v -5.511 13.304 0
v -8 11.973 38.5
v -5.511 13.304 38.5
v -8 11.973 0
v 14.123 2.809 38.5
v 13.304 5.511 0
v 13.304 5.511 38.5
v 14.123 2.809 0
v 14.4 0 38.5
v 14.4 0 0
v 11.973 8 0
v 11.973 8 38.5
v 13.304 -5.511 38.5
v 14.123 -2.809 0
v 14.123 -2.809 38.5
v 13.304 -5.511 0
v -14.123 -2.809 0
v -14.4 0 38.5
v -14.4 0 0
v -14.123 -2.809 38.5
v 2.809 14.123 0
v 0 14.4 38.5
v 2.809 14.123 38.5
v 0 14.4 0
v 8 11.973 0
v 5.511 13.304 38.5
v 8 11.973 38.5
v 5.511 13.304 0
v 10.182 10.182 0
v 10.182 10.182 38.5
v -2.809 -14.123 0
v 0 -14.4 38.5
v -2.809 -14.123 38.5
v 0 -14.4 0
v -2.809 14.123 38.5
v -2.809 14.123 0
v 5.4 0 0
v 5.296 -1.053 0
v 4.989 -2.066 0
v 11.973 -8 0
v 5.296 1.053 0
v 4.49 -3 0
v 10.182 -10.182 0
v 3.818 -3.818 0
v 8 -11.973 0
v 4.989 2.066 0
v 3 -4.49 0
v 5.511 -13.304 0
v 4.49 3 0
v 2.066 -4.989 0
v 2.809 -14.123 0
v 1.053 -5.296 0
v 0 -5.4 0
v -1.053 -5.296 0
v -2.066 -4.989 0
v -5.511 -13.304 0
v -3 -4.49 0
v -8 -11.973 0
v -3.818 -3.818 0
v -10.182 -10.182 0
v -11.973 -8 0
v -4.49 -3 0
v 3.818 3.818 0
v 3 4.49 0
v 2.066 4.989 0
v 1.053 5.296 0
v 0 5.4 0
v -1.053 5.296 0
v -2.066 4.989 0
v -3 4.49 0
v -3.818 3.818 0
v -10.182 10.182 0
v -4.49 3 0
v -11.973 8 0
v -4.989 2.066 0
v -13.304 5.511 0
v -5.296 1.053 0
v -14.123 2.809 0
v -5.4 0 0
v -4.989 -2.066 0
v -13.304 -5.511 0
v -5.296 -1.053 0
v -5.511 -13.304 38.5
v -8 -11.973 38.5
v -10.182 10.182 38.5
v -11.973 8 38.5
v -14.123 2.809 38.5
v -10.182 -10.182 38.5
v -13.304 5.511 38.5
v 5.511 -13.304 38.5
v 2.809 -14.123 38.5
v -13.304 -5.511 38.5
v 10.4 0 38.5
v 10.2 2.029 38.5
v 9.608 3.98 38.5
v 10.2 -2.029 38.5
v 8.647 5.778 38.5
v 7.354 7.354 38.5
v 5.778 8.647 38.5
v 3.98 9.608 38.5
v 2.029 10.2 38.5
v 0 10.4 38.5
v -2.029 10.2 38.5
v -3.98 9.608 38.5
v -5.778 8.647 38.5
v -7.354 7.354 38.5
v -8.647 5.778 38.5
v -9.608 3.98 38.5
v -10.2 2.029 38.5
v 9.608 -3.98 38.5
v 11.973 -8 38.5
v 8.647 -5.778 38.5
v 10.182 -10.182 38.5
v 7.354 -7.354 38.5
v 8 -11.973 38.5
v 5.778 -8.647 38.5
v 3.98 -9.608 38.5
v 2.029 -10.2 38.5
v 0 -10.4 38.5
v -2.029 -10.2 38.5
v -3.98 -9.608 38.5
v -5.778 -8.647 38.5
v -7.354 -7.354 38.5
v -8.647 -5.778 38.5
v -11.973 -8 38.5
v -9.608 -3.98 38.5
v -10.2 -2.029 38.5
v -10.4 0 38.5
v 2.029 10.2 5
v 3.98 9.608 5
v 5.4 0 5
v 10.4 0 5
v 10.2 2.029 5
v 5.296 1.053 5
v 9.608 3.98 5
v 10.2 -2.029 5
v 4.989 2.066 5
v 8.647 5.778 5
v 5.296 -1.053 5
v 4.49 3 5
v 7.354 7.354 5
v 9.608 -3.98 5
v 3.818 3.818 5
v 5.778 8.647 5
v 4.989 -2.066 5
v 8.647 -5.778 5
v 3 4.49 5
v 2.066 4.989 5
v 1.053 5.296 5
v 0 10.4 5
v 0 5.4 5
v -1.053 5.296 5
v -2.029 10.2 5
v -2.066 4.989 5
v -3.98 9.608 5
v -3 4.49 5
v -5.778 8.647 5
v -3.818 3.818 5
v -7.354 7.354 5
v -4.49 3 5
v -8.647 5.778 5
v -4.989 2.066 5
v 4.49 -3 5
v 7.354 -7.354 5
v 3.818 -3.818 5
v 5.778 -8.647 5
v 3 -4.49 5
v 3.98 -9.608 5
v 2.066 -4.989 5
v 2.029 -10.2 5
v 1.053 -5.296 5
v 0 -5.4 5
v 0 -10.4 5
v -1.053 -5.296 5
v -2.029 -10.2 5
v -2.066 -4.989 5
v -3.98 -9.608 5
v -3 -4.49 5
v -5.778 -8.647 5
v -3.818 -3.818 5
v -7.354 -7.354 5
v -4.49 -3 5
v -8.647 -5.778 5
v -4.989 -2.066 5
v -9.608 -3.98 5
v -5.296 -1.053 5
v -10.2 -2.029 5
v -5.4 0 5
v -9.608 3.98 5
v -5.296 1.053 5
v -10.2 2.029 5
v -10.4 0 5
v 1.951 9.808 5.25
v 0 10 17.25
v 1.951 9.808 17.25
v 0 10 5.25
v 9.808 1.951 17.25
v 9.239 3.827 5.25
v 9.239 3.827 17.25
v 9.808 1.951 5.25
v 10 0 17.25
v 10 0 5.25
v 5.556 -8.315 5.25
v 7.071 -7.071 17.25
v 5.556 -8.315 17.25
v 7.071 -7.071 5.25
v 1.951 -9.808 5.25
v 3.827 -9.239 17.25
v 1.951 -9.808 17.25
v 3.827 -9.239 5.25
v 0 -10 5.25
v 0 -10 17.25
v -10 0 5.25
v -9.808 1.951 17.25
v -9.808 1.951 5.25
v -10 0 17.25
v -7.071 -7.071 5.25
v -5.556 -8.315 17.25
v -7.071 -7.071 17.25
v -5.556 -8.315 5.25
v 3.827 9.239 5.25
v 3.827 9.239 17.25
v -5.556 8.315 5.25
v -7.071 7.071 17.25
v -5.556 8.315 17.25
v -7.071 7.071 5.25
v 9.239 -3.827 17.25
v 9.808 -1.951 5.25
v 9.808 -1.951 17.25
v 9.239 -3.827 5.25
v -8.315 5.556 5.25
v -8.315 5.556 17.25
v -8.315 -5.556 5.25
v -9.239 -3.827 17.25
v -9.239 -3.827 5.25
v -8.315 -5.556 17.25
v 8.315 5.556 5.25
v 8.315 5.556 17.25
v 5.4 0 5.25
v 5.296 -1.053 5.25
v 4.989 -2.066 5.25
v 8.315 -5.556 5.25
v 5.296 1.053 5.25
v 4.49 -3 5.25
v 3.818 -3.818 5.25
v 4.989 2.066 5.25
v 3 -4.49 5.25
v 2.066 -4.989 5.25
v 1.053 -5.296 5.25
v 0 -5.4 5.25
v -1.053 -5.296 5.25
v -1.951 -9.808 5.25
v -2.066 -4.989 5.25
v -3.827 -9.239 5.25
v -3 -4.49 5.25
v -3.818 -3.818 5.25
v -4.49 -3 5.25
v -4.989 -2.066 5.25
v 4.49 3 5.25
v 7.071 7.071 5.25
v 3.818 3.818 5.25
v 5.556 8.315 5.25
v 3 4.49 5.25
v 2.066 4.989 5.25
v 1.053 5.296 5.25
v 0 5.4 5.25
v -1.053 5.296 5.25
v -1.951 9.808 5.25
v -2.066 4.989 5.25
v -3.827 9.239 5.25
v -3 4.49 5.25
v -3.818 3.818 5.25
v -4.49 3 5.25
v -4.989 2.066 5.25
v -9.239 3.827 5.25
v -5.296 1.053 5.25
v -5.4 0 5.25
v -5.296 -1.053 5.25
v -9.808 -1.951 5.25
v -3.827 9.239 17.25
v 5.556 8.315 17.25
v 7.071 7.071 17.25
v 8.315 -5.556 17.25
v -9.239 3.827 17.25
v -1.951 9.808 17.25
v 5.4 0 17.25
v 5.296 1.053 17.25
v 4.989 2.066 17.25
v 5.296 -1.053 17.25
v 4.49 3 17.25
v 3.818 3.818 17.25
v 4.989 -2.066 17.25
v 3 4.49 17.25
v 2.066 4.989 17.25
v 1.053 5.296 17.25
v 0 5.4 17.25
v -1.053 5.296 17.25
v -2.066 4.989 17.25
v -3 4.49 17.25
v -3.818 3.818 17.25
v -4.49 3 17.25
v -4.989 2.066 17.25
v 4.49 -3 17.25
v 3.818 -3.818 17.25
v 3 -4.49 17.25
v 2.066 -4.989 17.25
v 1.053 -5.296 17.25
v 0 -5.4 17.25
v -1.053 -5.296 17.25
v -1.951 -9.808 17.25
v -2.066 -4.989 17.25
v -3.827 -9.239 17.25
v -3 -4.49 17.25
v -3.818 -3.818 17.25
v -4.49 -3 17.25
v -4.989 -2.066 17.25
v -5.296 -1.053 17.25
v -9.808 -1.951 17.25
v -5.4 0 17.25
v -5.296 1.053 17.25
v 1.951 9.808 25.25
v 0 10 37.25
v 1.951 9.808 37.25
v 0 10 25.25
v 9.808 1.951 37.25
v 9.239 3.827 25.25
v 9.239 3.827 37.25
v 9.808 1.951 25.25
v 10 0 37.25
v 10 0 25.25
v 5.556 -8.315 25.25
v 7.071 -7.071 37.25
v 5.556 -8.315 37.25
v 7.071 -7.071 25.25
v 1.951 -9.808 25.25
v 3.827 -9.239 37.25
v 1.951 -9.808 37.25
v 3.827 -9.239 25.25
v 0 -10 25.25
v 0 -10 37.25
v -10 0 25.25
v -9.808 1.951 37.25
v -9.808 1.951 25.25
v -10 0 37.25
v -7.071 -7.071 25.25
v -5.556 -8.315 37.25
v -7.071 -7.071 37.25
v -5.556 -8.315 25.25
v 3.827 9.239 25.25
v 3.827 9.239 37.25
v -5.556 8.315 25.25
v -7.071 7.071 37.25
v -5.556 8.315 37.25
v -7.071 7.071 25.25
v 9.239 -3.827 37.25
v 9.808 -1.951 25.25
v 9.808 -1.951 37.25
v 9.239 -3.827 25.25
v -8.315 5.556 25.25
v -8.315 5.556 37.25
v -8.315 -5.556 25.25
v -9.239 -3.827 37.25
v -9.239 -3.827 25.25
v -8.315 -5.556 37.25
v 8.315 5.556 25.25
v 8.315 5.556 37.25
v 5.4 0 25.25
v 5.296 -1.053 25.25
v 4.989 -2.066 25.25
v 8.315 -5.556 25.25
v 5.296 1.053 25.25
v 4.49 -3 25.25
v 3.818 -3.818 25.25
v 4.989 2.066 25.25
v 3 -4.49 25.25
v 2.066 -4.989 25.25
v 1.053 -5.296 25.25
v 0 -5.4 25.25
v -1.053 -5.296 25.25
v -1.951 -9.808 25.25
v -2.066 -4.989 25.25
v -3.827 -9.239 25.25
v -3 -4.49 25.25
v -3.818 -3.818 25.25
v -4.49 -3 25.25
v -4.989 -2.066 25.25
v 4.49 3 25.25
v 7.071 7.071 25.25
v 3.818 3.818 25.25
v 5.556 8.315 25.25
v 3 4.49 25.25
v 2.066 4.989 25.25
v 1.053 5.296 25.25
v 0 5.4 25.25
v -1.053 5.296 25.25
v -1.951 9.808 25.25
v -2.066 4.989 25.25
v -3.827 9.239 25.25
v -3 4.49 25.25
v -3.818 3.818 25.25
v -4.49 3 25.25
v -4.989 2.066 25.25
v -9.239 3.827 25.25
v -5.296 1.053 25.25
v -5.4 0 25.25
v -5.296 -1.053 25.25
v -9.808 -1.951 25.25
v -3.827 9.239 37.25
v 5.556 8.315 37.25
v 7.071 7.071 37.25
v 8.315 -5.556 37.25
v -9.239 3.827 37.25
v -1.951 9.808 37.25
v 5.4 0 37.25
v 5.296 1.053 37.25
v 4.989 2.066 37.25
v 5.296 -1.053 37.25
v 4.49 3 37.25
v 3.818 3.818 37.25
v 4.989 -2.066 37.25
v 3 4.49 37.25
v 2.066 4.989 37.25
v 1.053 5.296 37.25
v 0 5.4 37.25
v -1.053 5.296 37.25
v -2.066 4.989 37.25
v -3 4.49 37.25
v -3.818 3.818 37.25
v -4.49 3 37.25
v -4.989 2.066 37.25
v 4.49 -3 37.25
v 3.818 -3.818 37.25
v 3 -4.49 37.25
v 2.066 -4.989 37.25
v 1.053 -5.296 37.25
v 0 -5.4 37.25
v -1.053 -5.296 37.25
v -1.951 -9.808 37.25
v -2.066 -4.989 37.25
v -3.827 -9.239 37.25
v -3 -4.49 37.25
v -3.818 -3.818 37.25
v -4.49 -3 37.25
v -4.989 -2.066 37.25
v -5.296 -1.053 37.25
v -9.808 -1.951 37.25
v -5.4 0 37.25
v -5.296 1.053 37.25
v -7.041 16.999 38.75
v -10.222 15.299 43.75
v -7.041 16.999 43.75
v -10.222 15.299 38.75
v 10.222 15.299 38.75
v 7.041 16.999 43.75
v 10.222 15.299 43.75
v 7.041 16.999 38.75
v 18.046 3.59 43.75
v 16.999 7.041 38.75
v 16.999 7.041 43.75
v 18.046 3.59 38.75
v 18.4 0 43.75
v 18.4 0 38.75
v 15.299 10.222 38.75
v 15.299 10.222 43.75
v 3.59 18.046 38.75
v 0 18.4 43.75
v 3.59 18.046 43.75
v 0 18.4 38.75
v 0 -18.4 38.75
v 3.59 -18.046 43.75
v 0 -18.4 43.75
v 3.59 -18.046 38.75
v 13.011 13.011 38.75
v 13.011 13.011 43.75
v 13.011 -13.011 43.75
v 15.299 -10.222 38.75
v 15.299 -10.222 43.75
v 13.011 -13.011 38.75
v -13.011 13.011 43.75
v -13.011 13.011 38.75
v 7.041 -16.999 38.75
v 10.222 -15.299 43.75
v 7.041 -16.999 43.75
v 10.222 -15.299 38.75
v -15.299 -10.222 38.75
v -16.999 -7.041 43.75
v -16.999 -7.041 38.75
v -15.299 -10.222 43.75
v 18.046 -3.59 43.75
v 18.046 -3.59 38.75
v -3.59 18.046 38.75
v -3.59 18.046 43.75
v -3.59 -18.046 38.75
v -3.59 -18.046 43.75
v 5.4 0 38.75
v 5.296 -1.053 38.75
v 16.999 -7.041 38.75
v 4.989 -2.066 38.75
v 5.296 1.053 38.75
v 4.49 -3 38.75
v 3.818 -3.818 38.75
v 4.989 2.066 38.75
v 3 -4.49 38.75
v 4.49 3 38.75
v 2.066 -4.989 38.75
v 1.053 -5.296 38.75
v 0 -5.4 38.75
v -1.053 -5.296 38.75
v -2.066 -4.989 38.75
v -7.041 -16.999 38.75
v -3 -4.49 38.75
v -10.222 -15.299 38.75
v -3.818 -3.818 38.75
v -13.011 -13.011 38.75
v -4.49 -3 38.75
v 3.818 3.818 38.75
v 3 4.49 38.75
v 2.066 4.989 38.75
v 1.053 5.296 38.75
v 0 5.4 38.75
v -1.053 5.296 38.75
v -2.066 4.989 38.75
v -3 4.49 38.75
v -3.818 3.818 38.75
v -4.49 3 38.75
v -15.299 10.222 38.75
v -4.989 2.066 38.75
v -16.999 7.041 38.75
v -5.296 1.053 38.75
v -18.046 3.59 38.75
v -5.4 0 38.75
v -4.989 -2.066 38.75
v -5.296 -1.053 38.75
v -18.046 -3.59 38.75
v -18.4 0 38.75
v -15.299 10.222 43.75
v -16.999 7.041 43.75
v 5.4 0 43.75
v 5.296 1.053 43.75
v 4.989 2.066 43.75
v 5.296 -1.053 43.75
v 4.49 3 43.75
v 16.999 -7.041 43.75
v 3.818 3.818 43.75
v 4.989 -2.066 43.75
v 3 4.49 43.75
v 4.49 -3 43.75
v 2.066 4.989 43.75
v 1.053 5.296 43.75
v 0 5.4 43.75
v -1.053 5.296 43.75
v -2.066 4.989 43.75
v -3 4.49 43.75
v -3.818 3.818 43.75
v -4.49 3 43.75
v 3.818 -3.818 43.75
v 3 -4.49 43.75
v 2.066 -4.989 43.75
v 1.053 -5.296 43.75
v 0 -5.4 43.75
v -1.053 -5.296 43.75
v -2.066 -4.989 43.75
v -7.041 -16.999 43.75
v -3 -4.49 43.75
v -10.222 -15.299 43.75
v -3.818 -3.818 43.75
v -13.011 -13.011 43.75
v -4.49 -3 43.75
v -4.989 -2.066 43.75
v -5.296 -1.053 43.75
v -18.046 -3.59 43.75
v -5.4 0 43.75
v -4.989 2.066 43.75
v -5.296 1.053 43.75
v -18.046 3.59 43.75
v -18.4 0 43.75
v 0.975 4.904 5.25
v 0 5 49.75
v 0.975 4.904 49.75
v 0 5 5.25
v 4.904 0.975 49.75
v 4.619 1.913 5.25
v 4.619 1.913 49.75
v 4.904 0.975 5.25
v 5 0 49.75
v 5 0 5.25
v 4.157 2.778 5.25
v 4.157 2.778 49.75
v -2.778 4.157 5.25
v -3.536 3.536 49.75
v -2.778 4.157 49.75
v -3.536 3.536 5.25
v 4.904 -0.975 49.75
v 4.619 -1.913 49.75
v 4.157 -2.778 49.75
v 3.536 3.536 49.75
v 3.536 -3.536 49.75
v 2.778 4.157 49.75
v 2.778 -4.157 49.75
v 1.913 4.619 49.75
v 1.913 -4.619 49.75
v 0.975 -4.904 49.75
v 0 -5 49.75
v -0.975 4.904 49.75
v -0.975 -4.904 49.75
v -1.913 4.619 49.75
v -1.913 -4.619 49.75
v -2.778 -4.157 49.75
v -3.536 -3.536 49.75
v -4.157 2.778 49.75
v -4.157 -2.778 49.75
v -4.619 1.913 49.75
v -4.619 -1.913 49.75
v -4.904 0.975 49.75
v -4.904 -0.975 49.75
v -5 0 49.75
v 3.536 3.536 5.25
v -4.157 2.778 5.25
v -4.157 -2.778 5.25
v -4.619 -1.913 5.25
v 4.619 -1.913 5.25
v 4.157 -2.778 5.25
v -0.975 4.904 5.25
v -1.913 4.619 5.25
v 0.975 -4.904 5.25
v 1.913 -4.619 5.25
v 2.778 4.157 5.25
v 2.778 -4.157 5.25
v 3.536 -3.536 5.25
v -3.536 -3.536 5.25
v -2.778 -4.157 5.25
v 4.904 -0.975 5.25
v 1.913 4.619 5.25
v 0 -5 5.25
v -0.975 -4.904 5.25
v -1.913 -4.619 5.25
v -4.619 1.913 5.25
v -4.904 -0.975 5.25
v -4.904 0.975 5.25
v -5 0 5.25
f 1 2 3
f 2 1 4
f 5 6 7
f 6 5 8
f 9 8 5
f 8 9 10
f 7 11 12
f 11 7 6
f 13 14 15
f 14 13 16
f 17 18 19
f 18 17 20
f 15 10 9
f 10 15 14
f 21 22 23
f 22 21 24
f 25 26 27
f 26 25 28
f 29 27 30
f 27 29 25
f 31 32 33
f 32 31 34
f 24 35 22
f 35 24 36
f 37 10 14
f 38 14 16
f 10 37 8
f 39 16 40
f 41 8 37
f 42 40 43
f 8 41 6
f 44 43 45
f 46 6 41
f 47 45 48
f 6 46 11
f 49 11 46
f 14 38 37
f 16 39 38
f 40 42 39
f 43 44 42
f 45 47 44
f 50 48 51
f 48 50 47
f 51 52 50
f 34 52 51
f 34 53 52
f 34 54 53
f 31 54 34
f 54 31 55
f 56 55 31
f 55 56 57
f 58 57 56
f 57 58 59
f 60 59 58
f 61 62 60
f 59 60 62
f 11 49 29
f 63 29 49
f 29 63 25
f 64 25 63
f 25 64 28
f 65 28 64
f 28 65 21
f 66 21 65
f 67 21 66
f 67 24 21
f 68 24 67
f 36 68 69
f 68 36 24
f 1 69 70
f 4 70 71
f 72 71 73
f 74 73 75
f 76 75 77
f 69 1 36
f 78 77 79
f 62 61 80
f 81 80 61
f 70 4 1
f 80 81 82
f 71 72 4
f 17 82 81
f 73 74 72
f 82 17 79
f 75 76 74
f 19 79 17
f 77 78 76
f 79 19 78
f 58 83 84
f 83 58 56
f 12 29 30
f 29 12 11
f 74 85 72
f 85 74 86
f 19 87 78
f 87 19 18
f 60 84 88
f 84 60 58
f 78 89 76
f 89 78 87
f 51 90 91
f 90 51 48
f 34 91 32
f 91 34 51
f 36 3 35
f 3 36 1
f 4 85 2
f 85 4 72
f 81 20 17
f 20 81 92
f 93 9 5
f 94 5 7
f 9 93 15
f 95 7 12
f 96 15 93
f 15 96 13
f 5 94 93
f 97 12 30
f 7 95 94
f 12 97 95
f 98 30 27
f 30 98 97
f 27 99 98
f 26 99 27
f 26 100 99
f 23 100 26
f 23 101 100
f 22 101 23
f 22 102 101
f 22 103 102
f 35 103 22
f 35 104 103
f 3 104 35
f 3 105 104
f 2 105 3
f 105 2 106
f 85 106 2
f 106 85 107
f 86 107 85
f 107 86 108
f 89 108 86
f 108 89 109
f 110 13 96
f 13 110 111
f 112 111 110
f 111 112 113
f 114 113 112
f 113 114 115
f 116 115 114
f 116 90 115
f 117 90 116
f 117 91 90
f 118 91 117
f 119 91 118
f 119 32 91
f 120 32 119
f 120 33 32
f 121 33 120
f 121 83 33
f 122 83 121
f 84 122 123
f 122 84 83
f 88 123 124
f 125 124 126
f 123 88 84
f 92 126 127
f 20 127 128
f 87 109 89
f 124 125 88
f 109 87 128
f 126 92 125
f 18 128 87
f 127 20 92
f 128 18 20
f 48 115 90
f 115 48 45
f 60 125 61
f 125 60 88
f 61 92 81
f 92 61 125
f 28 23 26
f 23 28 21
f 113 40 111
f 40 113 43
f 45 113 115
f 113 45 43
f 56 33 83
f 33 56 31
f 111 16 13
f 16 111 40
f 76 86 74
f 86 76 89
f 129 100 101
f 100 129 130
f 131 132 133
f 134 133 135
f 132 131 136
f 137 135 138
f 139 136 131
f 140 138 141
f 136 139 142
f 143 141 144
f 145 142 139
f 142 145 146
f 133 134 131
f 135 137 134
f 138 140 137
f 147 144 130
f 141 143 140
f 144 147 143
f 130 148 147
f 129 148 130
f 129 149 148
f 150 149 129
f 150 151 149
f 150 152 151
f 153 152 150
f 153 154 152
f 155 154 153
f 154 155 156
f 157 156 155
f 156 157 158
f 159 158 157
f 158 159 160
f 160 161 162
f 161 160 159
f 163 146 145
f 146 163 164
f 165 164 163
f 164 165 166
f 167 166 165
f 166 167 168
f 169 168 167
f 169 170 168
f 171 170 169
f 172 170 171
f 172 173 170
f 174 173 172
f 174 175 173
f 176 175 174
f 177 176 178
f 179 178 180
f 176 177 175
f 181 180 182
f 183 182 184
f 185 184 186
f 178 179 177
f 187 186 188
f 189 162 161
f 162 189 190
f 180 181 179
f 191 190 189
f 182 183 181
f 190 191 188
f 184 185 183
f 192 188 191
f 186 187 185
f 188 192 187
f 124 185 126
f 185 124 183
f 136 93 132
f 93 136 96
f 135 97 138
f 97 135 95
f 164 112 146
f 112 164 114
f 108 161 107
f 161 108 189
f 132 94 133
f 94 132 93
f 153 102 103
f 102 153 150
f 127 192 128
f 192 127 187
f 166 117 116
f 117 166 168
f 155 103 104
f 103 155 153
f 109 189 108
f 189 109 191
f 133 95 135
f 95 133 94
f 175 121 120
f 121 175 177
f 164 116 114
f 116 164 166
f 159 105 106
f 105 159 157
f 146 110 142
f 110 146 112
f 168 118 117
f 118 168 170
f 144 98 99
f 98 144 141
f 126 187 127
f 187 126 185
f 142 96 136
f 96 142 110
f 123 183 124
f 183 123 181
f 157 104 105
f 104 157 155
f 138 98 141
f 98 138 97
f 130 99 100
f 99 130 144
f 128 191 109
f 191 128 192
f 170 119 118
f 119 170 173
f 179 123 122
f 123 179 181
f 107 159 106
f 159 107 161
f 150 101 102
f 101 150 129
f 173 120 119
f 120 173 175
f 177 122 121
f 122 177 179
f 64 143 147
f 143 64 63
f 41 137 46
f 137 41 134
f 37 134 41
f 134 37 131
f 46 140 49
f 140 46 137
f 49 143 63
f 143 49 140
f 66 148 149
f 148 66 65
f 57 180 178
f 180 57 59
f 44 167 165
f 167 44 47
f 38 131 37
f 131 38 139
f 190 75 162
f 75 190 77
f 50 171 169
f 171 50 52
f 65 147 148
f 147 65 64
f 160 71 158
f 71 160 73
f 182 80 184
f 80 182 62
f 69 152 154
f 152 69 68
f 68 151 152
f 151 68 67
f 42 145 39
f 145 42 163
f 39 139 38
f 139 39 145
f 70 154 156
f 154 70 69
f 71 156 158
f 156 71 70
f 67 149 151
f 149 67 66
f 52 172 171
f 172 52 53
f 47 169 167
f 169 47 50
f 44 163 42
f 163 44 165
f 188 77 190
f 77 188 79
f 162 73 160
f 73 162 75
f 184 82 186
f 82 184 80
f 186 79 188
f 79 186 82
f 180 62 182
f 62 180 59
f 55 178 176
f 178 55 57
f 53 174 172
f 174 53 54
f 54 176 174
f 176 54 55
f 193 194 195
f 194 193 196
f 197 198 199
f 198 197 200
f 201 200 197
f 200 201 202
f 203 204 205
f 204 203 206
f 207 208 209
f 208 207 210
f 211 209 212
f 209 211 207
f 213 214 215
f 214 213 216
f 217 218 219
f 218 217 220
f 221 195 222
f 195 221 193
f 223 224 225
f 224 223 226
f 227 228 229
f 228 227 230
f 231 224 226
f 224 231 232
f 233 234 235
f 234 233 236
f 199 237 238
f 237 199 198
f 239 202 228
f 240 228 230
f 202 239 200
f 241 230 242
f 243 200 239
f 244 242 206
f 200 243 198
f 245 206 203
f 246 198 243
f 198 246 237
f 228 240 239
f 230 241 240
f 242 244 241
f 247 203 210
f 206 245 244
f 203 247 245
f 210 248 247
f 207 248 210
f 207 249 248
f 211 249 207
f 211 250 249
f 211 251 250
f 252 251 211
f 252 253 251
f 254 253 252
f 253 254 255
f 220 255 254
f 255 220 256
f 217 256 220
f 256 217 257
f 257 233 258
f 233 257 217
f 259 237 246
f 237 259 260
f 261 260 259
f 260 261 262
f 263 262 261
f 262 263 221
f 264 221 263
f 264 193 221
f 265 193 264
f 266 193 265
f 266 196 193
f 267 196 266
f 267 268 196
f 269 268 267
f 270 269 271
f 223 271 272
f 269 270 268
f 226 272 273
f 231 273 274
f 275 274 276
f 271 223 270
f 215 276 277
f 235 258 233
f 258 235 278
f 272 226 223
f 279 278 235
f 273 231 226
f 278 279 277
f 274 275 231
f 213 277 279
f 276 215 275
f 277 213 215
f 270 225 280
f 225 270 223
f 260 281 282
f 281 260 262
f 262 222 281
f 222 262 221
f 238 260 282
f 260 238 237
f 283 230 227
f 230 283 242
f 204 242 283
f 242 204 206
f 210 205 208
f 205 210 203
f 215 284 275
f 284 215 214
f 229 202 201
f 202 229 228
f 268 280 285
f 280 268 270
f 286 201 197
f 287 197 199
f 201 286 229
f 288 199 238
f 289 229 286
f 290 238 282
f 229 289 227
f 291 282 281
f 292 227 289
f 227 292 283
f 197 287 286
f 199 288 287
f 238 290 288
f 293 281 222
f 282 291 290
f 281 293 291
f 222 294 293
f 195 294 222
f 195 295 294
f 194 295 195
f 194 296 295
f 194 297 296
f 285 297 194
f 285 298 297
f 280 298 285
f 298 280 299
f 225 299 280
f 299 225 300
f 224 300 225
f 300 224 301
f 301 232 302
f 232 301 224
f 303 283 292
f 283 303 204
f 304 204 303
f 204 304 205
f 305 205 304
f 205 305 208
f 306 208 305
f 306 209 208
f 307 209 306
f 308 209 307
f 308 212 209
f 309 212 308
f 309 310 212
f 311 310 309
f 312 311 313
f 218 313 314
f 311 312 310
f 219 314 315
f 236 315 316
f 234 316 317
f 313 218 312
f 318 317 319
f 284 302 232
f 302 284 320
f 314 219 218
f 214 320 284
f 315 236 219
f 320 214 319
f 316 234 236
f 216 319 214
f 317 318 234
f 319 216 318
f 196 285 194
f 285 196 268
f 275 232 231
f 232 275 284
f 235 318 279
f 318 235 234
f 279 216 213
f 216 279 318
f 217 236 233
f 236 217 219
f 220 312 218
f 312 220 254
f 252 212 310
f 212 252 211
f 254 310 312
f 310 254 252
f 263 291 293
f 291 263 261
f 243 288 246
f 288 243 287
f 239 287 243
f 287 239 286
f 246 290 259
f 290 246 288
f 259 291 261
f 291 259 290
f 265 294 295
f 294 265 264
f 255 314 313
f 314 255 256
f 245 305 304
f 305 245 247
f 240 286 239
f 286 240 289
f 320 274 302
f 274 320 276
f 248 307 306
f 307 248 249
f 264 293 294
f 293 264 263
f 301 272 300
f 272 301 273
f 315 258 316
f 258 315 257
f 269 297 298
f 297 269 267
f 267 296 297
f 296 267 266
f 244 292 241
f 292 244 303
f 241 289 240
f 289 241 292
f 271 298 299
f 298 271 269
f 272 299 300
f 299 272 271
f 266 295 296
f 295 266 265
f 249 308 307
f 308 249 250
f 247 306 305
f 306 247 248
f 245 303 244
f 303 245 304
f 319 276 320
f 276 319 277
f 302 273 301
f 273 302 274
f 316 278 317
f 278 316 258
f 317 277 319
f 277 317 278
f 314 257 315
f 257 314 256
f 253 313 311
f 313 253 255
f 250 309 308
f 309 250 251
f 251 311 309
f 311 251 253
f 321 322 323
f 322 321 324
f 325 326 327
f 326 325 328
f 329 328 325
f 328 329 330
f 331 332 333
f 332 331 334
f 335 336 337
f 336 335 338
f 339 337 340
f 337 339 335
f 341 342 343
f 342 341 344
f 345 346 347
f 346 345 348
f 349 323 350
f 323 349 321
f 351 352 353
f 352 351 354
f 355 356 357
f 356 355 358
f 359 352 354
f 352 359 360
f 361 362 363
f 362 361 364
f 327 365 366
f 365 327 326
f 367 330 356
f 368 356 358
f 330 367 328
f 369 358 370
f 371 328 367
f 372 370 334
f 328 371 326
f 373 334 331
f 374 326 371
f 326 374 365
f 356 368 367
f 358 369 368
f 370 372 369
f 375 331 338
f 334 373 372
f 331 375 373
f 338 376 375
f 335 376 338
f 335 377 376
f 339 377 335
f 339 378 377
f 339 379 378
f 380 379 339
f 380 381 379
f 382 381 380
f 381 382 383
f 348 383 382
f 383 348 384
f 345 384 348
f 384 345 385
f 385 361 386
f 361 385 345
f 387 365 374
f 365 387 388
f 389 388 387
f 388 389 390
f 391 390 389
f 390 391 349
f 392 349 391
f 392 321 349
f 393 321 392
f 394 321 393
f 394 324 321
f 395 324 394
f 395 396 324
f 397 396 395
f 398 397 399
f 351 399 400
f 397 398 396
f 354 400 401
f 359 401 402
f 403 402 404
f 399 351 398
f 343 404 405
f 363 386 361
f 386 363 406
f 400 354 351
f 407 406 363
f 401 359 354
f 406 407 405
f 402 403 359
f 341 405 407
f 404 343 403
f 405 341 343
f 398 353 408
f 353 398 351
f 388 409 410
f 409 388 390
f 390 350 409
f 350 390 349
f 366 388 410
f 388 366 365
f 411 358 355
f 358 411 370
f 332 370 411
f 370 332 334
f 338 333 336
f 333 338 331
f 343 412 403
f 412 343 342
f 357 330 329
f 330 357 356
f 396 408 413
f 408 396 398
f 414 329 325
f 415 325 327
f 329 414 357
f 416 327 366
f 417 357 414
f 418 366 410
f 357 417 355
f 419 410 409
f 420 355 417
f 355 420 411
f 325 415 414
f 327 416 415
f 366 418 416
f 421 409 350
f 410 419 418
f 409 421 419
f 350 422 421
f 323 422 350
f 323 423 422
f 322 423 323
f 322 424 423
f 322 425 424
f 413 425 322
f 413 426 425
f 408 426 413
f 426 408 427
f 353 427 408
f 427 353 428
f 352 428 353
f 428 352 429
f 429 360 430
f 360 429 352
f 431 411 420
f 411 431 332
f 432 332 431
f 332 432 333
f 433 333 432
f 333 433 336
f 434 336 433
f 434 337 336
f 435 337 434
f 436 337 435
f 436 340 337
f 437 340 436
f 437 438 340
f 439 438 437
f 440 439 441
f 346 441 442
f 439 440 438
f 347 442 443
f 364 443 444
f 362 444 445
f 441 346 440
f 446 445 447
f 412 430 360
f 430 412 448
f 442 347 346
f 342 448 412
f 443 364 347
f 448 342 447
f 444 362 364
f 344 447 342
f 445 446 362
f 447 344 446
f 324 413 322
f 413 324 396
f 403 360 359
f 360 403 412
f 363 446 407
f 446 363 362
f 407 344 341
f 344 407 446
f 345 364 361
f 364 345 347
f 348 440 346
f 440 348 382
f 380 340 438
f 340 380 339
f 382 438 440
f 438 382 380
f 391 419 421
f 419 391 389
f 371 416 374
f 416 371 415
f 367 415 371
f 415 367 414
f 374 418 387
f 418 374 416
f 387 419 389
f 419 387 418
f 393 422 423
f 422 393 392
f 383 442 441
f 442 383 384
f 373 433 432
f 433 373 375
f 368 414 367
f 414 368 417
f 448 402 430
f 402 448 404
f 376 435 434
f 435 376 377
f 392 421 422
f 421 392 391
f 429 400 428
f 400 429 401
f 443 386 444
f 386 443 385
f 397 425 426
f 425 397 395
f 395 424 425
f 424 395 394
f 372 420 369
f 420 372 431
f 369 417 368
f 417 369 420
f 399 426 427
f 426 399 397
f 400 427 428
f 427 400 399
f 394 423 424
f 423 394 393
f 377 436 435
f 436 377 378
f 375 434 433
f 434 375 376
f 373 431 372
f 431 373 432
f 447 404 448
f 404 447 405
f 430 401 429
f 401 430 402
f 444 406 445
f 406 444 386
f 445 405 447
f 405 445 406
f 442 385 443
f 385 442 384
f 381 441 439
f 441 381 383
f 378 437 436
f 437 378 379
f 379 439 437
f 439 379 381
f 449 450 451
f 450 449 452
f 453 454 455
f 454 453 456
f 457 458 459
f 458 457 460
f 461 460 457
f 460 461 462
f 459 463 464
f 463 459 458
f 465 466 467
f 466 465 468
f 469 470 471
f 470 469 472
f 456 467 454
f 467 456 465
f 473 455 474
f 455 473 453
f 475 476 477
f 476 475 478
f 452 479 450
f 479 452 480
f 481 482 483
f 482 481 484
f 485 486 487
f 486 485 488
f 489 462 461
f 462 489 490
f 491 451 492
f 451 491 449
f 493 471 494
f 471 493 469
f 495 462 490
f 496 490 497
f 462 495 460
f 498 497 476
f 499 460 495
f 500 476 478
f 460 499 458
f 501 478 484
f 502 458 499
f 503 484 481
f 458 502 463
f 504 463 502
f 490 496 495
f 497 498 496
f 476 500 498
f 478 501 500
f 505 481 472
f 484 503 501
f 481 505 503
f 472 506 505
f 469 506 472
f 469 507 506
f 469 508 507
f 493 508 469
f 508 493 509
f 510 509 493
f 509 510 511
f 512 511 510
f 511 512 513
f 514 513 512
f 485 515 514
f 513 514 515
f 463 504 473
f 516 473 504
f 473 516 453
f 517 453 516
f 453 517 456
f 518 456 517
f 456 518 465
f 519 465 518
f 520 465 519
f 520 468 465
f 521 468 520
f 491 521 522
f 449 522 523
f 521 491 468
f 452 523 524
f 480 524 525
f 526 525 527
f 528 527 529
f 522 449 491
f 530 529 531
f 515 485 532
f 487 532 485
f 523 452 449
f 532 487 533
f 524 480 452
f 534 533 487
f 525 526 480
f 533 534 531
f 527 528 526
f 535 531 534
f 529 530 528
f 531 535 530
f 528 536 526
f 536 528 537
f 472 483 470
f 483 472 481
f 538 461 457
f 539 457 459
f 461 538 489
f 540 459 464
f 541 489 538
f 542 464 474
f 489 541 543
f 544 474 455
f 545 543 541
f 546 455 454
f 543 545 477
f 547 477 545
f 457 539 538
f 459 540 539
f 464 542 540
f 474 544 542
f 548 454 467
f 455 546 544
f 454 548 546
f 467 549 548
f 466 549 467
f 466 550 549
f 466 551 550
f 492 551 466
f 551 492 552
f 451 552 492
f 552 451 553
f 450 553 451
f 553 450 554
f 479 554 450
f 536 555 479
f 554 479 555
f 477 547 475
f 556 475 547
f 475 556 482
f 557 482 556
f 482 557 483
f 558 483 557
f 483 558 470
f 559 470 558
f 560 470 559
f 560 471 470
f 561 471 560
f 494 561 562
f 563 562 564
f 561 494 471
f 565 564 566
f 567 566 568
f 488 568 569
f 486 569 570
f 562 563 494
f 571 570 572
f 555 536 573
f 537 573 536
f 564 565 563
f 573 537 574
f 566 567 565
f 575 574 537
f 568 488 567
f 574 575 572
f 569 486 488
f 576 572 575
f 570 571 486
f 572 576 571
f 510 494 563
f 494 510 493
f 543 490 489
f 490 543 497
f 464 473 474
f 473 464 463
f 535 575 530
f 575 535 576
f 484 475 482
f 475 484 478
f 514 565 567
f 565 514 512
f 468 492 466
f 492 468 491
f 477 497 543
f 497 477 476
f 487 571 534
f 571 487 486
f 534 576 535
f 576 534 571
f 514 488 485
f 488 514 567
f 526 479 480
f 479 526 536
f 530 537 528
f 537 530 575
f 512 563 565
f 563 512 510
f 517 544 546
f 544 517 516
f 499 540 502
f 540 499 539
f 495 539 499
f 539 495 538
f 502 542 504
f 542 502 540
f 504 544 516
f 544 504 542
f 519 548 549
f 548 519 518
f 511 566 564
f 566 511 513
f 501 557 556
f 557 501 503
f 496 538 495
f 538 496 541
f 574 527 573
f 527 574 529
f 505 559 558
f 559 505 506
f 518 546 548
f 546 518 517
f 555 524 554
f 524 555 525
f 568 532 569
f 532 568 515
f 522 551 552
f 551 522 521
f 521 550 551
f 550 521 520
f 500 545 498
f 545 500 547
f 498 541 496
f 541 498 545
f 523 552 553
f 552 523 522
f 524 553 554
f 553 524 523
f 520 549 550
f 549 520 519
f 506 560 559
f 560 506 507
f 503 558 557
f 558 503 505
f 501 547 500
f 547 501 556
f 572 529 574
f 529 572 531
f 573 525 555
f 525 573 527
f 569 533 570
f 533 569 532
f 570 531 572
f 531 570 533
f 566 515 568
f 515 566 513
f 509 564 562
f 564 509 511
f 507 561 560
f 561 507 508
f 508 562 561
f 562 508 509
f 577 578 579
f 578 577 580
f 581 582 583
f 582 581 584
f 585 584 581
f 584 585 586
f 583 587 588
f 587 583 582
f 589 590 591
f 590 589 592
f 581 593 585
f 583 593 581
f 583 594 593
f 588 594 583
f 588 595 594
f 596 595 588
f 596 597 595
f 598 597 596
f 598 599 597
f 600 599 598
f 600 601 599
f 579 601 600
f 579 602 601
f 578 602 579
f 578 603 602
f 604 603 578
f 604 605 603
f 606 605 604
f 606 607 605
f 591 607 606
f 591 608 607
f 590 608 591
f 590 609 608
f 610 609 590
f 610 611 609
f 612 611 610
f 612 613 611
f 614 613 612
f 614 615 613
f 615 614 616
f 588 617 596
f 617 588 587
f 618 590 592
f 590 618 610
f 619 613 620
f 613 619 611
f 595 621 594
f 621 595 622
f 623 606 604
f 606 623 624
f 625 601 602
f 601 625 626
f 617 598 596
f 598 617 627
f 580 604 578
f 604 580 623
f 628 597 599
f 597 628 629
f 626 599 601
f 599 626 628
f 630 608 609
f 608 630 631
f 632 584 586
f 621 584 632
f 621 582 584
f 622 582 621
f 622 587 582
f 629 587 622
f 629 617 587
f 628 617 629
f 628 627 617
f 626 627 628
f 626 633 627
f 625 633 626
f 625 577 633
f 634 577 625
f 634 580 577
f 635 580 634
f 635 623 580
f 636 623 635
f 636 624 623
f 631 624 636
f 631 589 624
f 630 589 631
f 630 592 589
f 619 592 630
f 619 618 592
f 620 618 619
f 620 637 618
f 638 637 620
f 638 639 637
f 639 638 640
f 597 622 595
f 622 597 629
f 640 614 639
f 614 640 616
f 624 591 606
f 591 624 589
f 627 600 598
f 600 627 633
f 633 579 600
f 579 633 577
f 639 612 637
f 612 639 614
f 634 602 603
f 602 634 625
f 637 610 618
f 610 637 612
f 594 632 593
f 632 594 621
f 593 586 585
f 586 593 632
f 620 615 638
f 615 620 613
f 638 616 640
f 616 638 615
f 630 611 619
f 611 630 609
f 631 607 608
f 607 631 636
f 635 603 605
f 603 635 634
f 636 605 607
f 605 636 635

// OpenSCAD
$fn = 32;

// ------------------------------------------------------------------------
// Shaft station: cup d28.8 x 38.5 mm, shaft d10
// Every part is its own module, assembly() places every instance.
// ------------------------------------------------------------------------

// --- part 1 ---
module housing_cup() {
  difference() {
    cylinder(h = 38.5, d = 28.8);
    translate([0, 0, 5]) cylinder(h = 34.5, d = 20.8);
    translate([0, 0, -1]) cylinder(h = 7, d = 10.8);
  }
}

// --- part 2 ---
module bearing_lower() {
  difference() {
      translate([0, 0, 0]) cylinder(h = 12, d = 20);
      translate([0, 0, -1]) cylinder(h = 14, d = 10.8);
    }
}

// --- part 3 ---
module bearing_upper() {
  difference() {
      translate([0, 0, 0]) cylinder(h = 12, d = 20);
      translate([0, 0, -1]) cylinder(h = 14, d = 10.8);
    }
}

// --- part 4 ---
module station_shaft() {
  translate([0, 0, -22.25]) cylinder(h = 44.5, d = 10);
}

// --- part 5 ---
module station_cover() {
  difference() {
    cylinder(h = 5, d = 36.8);
    translate([0, 0, -1]) cylinder(h = 7, d = 10.8);
  }
}

// --- assembly ---
module assembly() {
  color([0.80, 0.24, 0.20]) translate([0, 0, 0]) rotate([0, 0, 0]) housing_cup();
  color([0.20, 0.45, 0.75]) translate([0, 0, 5.25]) rotate([0, 0, 0]) bearing_lower();
  color([0.25, 0.62, 0.32]) translate([0, 0, 25.25]) rotate([0, 0, 0]) bearing_upper();
  color([0.92, 0.70, 0.18]) translate([0, 0, 27.5]) rotate([0, 0, 0]) station_shaft();
  color([0.58, 0.35, 0.70]) translate([0, 0, 38.75]) rotate([0, 0, 0]) station_cover();
}

assembly();
